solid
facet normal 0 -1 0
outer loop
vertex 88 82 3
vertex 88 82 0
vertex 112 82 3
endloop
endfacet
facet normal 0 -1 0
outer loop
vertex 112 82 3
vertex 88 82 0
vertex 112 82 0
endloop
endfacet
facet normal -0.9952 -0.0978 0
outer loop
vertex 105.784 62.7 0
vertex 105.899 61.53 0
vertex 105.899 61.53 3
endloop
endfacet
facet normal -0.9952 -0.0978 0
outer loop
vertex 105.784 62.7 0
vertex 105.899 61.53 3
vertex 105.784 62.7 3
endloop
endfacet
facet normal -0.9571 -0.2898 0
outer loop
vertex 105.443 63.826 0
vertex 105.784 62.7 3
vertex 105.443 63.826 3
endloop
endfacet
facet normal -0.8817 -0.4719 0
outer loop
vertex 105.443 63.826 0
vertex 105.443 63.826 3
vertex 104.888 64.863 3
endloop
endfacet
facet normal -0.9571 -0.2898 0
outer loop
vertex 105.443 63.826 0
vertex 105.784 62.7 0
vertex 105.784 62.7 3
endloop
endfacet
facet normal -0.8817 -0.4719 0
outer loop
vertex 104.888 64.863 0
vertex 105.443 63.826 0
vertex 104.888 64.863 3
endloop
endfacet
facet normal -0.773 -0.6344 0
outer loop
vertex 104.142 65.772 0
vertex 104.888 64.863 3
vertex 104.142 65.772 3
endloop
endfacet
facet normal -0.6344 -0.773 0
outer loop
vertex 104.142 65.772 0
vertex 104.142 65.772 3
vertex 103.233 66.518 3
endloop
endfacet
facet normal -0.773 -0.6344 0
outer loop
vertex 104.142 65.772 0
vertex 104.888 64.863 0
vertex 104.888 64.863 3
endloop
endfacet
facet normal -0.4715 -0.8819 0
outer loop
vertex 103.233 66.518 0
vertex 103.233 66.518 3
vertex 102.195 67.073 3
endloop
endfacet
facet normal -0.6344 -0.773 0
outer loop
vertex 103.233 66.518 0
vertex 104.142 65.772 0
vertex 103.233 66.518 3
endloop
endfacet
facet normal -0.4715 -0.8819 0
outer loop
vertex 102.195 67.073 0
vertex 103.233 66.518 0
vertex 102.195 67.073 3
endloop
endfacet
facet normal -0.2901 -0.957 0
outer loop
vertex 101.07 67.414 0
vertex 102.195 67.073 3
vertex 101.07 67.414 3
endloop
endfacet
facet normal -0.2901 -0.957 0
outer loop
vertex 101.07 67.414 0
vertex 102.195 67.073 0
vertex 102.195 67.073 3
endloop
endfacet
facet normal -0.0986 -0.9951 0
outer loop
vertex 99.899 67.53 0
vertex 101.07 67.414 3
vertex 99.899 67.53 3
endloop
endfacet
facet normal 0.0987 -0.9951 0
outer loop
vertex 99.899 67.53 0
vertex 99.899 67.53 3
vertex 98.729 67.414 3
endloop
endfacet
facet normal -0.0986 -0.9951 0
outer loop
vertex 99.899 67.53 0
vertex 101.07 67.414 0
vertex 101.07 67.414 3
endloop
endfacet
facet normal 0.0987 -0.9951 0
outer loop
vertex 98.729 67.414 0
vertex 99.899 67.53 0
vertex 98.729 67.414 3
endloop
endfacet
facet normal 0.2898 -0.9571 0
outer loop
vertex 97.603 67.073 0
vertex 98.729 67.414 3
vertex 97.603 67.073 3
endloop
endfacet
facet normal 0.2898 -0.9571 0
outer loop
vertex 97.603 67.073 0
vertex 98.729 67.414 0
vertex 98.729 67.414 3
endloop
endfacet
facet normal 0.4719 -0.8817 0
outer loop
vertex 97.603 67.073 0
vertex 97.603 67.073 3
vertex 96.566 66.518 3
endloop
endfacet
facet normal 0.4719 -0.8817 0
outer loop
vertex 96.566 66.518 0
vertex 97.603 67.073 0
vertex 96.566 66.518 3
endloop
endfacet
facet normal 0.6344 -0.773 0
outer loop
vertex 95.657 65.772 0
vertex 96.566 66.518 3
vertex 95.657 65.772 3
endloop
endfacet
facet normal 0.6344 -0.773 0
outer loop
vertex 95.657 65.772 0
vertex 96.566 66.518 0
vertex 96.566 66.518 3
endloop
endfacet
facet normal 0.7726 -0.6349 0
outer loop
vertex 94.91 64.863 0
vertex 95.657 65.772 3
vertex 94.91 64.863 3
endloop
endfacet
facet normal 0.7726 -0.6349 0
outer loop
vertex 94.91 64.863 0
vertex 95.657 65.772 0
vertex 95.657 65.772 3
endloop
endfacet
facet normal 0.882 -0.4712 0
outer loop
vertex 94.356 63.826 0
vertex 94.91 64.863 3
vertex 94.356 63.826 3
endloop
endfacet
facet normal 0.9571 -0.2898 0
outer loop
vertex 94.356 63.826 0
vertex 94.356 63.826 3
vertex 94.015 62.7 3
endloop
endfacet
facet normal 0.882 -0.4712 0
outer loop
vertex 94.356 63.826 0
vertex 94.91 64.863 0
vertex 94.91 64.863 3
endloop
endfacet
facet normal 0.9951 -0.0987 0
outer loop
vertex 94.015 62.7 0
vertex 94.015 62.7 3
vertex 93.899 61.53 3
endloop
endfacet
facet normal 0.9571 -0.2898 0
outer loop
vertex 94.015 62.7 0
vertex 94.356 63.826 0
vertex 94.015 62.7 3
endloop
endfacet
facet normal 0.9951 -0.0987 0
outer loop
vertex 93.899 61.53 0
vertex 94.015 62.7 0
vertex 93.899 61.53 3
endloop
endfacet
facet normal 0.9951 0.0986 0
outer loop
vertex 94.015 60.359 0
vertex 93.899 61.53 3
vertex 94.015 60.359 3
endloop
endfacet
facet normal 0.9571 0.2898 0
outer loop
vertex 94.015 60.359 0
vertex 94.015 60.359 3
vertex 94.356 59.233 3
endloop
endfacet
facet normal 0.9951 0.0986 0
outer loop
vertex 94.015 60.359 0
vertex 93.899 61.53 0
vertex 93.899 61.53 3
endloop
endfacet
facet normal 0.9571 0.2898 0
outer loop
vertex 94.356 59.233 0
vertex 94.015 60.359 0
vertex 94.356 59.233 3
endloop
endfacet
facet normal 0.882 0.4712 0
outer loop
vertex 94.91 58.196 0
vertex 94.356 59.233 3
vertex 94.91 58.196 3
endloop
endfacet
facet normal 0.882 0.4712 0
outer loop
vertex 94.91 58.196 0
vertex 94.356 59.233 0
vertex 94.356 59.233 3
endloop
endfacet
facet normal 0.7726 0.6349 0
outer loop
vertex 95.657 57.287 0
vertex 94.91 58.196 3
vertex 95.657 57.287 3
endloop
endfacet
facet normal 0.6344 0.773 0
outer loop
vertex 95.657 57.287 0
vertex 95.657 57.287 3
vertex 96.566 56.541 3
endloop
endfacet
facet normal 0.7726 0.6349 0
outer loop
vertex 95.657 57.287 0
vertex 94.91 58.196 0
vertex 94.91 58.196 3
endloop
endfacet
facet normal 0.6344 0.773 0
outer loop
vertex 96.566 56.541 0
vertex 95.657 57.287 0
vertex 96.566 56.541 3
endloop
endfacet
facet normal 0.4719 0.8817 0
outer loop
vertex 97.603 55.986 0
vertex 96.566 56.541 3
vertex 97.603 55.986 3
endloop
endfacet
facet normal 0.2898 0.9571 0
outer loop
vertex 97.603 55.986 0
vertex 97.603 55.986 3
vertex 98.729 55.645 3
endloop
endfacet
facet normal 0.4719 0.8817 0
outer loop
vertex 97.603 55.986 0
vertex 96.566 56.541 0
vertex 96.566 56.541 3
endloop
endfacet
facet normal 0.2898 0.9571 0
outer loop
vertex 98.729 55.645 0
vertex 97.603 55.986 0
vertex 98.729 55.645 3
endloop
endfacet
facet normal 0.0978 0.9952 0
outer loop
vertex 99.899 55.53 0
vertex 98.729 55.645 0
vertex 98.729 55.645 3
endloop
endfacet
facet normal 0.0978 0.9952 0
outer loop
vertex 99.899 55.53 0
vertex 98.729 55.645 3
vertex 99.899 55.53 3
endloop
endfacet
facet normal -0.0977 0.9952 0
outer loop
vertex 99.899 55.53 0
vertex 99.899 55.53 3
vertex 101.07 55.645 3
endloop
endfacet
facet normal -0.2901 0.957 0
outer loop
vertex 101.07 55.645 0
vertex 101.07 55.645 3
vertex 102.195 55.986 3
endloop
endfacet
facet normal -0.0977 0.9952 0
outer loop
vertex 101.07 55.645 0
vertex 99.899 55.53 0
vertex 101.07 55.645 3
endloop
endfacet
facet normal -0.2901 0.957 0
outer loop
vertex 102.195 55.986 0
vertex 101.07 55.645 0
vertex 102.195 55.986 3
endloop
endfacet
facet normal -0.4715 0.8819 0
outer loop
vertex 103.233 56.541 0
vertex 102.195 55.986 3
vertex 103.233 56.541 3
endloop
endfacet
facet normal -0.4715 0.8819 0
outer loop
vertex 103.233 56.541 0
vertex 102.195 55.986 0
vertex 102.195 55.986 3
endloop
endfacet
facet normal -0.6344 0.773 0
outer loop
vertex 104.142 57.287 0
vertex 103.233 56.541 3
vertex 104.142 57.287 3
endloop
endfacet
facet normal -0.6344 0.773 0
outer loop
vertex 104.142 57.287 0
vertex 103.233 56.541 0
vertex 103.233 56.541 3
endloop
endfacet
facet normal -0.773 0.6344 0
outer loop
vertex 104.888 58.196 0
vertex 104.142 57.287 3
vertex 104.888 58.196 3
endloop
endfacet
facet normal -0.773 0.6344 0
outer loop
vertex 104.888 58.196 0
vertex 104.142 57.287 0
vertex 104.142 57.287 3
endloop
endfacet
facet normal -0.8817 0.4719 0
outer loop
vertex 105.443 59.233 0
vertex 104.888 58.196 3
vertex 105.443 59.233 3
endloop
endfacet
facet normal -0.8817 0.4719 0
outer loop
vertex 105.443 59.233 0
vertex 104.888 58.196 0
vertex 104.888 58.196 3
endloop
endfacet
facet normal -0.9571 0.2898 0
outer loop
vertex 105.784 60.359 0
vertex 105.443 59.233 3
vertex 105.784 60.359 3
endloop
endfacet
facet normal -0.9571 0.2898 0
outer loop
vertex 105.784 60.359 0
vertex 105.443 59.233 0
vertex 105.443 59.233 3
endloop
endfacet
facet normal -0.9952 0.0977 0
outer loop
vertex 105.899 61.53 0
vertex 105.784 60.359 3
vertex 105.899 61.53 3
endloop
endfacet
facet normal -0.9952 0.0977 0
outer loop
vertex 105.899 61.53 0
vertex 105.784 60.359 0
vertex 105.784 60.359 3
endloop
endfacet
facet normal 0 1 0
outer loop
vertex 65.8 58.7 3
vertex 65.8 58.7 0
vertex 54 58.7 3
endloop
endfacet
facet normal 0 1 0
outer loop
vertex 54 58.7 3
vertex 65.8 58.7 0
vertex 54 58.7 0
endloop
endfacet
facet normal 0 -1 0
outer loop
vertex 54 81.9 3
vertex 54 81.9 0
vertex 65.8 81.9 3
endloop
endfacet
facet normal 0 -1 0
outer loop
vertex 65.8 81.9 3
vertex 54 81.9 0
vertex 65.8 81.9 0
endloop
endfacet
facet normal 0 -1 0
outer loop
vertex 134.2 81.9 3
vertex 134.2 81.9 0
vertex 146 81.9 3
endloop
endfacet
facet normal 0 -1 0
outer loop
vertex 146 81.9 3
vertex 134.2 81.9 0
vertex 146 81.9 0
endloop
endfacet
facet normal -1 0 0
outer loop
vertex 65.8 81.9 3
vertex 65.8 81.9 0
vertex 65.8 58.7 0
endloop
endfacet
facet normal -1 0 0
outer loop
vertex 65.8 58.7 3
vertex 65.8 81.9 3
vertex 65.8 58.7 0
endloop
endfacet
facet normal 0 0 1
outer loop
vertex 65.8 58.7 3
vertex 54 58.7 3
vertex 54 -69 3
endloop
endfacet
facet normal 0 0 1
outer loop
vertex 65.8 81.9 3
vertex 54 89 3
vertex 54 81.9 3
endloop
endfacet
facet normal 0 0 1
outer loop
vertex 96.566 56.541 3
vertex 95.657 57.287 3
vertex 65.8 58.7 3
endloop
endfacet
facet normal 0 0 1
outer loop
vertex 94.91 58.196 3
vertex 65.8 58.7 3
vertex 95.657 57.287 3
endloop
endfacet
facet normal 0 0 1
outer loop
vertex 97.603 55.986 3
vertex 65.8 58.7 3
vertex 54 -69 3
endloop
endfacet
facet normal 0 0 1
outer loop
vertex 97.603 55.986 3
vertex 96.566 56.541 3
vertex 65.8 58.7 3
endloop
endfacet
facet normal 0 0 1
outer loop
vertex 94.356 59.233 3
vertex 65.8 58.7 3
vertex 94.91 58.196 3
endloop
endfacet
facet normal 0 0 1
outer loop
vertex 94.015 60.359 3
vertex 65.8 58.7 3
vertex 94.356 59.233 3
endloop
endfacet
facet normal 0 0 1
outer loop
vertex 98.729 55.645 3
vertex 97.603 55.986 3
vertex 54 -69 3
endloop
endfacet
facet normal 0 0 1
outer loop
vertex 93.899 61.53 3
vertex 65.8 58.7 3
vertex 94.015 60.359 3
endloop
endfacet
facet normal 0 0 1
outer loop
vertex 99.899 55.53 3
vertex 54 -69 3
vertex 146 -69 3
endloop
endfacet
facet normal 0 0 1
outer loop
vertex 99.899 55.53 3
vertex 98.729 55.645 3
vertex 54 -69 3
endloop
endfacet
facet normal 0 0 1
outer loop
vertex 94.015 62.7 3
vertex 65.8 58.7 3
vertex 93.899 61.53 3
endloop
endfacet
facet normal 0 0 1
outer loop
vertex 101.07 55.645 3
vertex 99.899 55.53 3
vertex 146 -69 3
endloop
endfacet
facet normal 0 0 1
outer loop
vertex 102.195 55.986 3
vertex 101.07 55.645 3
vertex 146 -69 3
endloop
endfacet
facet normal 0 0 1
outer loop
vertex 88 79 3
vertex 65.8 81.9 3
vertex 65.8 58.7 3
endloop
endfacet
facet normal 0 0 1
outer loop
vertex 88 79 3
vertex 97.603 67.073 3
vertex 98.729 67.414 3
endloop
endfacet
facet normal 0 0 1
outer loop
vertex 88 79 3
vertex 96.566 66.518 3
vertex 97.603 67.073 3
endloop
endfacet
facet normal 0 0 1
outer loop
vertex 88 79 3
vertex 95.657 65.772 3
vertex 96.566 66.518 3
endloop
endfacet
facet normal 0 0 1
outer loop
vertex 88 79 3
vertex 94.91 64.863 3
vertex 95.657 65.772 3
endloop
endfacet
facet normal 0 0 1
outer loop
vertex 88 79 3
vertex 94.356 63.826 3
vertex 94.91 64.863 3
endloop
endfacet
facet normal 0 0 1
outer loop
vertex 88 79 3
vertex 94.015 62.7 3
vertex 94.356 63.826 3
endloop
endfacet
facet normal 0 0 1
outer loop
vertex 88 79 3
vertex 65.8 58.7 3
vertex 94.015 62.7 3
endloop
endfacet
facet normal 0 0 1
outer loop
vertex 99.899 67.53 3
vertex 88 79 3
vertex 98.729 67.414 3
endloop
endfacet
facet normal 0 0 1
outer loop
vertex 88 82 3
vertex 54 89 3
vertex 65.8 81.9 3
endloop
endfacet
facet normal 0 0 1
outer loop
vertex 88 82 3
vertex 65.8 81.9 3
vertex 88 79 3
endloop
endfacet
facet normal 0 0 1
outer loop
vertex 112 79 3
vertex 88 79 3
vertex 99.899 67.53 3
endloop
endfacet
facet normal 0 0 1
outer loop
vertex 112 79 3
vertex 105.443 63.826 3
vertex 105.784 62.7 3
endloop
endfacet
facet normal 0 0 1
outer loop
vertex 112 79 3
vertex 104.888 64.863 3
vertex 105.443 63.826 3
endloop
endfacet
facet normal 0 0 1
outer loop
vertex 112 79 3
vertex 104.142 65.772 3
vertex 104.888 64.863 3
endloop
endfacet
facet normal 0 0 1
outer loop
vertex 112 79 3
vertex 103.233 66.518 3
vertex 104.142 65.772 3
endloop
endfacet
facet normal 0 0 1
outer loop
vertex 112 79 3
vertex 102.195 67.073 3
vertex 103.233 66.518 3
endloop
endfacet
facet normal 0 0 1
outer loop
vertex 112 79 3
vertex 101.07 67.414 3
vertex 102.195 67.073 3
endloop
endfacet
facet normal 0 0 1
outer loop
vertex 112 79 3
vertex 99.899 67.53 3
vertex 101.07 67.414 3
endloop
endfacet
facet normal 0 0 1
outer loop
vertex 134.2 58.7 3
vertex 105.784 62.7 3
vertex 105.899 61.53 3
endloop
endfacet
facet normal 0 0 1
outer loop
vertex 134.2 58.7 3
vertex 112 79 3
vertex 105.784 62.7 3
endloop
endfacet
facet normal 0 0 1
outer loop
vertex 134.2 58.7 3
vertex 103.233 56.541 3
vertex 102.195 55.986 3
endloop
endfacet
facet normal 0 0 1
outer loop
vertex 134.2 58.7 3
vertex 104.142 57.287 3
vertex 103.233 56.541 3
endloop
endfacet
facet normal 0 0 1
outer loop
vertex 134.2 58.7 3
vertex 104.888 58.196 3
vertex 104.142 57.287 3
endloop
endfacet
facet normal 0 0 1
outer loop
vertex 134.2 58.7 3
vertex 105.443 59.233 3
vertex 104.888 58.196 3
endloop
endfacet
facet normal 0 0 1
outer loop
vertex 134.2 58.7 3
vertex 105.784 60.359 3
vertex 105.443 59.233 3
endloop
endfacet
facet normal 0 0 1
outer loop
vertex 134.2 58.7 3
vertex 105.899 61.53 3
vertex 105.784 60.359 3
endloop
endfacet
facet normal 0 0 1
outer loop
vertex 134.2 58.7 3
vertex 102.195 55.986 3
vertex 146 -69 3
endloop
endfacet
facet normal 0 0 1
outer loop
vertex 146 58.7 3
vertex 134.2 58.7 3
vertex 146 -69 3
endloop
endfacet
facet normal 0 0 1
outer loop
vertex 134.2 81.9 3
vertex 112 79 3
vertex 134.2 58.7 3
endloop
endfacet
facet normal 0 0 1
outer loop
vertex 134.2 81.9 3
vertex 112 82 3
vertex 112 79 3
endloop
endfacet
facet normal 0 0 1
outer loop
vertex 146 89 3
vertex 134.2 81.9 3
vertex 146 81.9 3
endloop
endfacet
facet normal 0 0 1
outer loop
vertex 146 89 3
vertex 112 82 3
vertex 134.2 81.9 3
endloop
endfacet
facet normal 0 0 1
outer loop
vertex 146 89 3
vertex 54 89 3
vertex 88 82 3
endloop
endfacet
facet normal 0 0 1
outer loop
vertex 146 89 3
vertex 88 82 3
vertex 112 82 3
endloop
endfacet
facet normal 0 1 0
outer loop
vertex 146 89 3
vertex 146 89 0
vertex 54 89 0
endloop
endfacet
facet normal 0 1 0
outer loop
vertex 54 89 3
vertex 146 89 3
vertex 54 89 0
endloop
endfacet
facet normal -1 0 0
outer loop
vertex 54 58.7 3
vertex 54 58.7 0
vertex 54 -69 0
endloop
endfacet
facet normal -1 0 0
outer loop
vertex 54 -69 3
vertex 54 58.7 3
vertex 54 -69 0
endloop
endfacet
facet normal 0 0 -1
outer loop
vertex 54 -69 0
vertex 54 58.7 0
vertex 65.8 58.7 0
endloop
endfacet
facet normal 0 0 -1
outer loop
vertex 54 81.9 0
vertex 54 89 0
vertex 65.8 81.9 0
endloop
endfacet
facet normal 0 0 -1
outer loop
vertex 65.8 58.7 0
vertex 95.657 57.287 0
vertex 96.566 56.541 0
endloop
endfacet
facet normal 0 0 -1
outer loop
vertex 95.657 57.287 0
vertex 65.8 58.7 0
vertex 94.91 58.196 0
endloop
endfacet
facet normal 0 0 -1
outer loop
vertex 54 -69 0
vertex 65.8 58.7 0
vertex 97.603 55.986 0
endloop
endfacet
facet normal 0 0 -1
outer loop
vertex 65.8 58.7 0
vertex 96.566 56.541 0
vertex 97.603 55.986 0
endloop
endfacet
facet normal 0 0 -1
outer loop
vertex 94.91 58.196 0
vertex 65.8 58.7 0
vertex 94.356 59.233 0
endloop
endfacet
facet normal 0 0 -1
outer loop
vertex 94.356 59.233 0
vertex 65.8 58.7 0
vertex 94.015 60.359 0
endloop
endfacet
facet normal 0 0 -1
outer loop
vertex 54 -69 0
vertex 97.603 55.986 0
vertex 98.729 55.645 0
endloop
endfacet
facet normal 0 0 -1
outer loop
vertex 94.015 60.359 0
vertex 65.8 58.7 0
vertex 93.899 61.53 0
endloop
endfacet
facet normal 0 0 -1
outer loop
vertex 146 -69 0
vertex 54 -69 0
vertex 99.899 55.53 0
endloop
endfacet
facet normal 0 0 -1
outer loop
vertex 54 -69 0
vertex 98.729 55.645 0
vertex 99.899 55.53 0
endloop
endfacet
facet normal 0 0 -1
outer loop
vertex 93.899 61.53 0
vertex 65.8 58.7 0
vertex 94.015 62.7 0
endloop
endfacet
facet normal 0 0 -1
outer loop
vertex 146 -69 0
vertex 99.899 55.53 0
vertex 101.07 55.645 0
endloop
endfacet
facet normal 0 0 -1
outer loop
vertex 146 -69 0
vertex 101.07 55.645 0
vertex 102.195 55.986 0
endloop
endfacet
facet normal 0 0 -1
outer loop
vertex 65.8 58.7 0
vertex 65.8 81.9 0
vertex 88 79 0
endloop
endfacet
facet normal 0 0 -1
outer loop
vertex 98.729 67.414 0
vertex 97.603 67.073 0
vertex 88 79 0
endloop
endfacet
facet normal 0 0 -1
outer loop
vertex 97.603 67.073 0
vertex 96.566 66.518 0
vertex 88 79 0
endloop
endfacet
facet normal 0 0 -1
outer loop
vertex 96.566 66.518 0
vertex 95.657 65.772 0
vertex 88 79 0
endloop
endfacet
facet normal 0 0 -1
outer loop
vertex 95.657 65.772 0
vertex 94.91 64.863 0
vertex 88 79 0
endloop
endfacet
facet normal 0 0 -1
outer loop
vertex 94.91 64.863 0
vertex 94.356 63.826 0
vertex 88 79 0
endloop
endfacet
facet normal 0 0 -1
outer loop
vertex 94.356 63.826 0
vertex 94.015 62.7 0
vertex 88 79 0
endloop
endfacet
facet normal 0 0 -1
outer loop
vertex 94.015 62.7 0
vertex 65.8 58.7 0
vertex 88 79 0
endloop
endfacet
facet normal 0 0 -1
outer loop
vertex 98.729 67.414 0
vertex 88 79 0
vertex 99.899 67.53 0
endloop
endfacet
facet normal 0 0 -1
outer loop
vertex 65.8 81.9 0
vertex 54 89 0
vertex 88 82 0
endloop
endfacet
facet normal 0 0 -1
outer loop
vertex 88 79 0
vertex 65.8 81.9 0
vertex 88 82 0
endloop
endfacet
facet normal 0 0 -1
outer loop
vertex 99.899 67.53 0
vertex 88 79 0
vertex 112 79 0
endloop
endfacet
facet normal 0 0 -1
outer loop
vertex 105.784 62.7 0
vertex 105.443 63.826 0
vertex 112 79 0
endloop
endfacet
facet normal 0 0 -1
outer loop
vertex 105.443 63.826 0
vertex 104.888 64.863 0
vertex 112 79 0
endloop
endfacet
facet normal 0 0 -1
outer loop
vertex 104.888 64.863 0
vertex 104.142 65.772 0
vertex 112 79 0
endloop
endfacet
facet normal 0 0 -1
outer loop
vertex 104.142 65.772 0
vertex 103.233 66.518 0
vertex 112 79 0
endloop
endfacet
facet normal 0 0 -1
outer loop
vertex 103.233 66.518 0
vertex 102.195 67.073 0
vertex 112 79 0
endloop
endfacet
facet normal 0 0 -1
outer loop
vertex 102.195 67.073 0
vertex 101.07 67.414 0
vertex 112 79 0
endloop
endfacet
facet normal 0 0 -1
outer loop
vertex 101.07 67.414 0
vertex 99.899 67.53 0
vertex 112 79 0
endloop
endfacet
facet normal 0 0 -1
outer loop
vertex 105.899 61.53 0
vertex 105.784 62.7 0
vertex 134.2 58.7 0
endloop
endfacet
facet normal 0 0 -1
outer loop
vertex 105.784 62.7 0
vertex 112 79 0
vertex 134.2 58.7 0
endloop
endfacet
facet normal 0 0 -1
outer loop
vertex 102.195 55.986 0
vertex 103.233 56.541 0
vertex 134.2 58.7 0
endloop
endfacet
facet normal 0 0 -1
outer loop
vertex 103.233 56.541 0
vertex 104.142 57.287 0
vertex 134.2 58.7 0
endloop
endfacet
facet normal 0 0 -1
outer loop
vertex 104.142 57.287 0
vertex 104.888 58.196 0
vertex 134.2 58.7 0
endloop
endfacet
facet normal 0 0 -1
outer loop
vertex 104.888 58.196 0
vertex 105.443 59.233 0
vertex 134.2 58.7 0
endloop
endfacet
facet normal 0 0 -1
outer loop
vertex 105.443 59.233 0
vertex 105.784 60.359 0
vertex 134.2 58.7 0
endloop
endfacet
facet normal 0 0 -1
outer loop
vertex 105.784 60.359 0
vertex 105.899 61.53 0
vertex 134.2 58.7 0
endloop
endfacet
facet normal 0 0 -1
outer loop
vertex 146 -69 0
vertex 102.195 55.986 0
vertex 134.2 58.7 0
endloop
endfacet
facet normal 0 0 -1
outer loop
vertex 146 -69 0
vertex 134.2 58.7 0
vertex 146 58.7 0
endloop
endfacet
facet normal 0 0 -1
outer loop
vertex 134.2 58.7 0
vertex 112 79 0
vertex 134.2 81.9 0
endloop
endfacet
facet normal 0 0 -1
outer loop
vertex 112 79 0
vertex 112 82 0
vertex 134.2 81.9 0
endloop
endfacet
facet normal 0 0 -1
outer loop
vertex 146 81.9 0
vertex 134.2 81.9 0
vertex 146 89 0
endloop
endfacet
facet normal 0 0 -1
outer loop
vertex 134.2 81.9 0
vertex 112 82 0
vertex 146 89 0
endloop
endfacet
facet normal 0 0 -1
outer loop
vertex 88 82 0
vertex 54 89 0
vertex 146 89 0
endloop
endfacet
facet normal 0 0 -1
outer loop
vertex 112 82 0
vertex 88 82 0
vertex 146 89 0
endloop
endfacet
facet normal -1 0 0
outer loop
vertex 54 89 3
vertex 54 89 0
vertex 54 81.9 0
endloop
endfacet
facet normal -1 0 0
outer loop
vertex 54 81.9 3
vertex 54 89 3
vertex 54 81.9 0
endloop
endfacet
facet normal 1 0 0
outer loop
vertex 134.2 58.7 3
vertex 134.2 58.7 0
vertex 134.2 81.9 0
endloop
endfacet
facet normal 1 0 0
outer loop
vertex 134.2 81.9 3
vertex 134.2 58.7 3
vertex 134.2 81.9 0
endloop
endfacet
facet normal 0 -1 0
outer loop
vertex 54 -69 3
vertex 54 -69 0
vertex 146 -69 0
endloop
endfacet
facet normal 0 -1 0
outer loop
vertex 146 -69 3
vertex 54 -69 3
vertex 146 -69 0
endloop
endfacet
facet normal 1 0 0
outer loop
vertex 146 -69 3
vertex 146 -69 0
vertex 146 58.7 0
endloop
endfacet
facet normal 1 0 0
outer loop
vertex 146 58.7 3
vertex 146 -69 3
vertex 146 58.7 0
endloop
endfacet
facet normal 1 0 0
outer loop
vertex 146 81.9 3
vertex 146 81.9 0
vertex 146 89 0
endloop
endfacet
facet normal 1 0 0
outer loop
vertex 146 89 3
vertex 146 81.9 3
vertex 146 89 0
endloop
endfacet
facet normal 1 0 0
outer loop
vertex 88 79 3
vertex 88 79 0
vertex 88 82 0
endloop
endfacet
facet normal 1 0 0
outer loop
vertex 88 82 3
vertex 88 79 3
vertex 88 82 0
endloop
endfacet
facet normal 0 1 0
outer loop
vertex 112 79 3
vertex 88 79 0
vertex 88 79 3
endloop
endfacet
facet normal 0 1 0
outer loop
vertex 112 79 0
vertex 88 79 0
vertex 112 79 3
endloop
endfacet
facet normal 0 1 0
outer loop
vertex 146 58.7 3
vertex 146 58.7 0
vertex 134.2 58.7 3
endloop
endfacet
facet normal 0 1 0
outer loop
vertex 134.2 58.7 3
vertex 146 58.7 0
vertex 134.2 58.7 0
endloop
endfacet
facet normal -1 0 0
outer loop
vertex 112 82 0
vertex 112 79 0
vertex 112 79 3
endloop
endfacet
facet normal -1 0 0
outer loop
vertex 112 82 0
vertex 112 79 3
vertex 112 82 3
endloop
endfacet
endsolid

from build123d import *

# Parameters (mm, degrees)
MODEL_R                 = 6
MODEL_W                 = 24
MODEL_H                 = 3
SALIENTE_EXTRUIR1_DEPTH = 3


with BuildPart() as part:
    # Model → Saliente-Extruir1 (new body)
    with BuildSketch(Plane.XY):
        Polygon((54, 89), (54, 81.9), (65.8, 81.9), (65.8, 58.7), (54, 58.7), (54, -69), (146, -69), (146, 58.7), (134.2, 58.7), (134.2, 81.9), (146, 81.9), (146, 89), align=None)
        with Locations((99.899304233, 61.529562992)):
            Circle(MODEL_R, mode=Mode.SUBTRACT)
        with Locations((100, 80.5)):
            Rectangle(MODEL_W, MODEL_H, mode=Mode.SUBTRACT)
    extrude(amount=SALIENTE_EXTRUIR1_DEPTH)


solid = part.part
